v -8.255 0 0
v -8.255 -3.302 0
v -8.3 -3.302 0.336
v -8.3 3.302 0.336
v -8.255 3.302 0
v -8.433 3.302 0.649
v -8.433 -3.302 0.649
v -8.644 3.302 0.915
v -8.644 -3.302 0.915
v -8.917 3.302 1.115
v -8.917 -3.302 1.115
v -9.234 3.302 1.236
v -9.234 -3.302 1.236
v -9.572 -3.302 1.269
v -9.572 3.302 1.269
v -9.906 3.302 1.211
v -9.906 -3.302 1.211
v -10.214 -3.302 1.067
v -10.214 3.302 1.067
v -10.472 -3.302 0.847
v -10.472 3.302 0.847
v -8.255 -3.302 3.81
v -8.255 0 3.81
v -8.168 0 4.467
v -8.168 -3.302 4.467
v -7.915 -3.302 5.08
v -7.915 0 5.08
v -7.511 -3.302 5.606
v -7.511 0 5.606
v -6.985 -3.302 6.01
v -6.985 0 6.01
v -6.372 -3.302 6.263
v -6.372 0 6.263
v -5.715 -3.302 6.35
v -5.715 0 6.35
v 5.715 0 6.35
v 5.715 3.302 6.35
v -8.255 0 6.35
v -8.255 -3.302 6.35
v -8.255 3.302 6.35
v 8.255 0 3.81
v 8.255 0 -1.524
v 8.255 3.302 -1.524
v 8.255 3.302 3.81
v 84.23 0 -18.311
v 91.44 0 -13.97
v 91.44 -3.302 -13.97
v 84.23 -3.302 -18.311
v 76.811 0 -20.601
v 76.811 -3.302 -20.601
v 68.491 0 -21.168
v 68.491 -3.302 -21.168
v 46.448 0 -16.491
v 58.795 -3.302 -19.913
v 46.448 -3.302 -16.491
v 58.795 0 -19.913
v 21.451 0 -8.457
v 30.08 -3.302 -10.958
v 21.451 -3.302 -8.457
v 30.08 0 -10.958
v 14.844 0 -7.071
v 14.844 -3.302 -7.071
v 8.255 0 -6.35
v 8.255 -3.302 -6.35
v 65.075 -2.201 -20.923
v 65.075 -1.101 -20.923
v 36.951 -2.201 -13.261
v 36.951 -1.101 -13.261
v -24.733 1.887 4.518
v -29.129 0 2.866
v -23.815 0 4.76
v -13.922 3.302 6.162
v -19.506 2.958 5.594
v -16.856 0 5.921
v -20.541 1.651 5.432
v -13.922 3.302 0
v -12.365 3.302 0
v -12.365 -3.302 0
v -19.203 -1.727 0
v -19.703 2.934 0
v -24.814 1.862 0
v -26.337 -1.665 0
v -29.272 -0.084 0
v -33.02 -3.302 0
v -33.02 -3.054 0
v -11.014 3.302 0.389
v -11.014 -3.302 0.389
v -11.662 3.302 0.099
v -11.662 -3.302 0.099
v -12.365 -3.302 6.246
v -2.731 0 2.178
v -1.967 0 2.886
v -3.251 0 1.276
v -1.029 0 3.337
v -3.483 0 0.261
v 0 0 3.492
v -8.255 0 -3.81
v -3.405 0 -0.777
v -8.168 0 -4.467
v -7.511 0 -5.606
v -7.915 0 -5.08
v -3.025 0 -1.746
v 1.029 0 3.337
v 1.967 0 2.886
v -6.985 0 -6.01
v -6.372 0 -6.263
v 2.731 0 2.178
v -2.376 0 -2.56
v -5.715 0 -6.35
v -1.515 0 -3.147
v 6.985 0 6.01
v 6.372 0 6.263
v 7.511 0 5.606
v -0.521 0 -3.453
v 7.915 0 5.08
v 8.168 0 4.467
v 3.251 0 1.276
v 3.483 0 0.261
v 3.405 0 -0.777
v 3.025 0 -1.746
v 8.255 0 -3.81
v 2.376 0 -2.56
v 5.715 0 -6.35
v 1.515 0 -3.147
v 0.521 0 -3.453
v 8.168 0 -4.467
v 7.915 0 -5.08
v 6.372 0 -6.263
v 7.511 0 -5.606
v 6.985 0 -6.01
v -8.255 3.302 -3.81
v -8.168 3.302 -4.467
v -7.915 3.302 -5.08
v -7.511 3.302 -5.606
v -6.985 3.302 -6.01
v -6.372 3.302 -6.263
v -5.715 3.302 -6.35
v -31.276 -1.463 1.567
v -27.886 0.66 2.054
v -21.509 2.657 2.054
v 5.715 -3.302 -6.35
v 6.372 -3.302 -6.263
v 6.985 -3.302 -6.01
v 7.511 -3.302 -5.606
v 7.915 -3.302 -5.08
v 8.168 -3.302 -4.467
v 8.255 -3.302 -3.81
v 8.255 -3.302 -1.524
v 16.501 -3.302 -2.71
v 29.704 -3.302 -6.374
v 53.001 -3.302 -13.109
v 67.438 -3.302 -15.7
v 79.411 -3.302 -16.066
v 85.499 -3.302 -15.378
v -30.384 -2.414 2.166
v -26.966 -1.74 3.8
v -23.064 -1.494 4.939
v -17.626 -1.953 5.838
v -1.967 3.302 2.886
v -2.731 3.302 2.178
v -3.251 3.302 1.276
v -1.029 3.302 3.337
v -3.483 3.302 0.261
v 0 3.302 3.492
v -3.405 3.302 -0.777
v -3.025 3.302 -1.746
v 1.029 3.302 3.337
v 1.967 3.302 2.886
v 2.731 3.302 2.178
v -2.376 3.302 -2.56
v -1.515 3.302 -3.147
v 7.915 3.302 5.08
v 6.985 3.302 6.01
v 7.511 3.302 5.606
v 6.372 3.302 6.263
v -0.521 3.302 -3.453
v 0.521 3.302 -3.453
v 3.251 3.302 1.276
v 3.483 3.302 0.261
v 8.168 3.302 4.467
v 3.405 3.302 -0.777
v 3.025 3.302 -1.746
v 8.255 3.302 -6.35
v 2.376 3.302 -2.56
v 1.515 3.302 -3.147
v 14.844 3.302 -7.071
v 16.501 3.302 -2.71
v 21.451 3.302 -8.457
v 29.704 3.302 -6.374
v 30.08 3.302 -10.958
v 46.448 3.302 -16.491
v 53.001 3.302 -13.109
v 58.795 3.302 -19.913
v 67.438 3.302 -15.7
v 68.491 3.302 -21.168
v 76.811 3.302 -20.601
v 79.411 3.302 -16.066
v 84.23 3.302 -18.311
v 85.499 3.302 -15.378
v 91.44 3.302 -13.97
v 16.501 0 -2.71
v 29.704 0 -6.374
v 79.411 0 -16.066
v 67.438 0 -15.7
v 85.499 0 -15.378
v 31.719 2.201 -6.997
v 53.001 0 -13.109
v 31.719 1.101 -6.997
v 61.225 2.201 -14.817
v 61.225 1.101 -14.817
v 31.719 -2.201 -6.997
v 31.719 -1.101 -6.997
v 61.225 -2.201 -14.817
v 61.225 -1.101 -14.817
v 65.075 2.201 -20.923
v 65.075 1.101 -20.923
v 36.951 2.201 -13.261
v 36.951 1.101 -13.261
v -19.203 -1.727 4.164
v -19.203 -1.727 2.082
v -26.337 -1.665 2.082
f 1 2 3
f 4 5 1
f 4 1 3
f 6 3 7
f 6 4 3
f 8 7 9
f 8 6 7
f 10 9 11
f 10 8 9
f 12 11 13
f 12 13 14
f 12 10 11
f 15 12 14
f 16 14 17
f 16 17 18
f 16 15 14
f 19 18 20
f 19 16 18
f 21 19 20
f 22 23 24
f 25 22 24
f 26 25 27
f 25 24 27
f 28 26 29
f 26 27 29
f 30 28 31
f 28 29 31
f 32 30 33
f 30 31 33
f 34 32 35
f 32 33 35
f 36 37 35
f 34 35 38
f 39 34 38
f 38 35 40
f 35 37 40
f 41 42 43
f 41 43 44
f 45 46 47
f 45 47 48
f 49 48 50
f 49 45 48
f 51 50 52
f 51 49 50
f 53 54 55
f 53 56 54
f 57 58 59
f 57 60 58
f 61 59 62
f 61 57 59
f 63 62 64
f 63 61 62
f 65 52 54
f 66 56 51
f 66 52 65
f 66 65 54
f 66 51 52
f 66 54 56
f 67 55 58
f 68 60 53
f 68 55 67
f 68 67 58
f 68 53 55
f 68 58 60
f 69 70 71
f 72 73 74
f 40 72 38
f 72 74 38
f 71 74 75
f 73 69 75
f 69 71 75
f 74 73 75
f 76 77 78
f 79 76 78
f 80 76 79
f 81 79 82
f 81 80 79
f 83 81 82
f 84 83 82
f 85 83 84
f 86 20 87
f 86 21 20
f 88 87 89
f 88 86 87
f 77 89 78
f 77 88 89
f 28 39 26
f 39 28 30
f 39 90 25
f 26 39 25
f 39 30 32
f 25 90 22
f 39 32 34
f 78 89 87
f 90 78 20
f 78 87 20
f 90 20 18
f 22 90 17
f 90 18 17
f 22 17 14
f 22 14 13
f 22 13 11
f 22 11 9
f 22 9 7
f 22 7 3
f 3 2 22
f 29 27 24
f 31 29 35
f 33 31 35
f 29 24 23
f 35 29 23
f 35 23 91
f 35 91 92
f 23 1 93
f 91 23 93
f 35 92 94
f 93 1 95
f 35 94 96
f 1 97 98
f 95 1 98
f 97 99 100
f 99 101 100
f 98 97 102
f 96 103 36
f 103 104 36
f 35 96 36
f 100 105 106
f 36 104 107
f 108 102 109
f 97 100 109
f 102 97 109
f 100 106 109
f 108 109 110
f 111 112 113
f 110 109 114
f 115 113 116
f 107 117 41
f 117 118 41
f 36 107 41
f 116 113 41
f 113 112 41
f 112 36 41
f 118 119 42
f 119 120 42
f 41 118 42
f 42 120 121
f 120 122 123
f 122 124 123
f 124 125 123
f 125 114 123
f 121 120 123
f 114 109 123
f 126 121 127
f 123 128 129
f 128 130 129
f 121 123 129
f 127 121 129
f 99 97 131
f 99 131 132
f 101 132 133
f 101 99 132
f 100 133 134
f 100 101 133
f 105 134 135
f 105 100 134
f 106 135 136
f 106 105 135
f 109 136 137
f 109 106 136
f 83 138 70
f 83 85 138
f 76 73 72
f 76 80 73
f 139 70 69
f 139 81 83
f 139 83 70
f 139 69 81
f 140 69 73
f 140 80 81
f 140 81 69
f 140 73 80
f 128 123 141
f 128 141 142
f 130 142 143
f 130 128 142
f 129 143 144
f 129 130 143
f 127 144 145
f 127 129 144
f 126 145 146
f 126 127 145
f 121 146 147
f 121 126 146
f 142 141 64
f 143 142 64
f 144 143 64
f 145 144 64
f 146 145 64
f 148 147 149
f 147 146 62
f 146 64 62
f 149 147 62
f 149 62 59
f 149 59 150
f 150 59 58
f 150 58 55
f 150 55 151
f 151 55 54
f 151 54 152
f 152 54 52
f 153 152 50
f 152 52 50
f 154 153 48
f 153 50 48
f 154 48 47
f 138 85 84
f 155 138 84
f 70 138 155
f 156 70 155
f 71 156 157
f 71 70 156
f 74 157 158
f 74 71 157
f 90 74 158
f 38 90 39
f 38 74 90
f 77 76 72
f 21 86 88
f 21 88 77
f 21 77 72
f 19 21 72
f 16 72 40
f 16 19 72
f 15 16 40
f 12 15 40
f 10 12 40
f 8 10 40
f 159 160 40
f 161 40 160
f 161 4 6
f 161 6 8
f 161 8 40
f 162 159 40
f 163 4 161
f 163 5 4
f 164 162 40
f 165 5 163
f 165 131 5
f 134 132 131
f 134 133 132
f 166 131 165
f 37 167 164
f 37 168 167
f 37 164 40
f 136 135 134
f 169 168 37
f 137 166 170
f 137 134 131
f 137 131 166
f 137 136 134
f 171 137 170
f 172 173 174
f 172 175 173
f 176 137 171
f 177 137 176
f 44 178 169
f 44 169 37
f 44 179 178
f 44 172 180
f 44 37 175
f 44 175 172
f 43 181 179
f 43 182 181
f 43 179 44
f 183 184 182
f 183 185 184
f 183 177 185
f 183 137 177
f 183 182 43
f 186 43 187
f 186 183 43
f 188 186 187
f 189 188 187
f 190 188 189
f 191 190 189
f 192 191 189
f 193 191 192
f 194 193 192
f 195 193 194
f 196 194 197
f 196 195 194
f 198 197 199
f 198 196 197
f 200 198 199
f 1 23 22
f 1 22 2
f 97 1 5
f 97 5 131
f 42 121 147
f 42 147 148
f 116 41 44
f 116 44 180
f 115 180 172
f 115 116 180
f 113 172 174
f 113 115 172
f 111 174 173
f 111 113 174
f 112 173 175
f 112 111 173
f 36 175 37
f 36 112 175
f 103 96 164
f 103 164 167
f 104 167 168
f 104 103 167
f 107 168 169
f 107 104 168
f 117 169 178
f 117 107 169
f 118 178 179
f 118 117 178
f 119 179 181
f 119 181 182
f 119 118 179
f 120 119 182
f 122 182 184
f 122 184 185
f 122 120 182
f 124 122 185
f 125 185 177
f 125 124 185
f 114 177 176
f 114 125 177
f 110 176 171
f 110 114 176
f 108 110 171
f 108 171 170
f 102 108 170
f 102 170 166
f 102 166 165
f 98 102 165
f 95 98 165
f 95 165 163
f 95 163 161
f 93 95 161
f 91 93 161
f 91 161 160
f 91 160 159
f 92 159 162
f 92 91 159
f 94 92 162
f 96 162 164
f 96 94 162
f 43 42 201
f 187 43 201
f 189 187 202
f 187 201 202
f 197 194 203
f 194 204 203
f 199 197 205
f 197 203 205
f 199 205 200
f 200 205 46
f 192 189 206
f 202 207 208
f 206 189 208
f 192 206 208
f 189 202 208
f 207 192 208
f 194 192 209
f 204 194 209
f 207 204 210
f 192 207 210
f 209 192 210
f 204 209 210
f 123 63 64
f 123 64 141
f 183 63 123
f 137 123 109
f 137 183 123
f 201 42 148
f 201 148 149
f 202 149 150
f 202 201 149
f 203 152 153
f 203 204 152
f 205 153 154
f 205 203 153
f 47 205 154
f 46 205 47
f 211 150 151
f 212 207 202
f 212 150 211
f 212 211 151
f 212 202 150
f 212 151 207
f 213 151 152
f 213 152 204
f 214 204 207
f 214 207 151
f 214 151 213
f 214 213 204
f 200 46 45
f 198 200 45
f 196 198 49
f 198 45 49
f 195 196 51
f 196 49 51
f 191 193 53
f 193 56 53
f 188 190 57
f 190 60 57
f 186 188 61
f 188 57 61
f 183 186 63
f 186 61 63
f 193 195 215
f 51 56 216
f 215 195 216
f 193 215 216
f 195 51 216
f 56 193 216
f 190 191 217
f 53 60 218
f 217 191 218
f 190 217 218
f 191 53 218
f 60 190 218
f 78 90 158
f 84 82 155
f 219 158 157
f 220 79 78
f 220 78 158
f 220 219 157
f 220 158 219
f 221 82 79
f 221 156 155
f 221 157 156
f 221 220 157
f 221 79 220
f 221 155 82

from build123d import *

# Parameters (mm, degrees)
SKETCH1_R           = 3.4925
BOSS_EXTRUDE3_DEPTH = 3.302
BOSS_EXTRUDE4_DEPTH = 3.302
BOSS_EXTRUDE5_DEPTH = 3.302
CUT_EXTRUDE1_REACH  = 8.35


with BuildPart() as part:
    # Sketch1 → Boss-Extrude3 (new body)
    with BuildSketch(Plane(origin=(0, 0, 0), x_dir=(1, 0, 0), z_dir=(0, 1, 0))):
        with BuildLine():
            ThreePointArc((-10.47160211, -0.846666667), (-11.327855674, -0.22130784), (-12.364806331, 0))
            Line((-12.364806331, 0), (-33.02, 0))
            add(Edge.make_bspline(
                [(-33.02, 0), (-27.473096433, -6.223159861), (-8.255, -6.35)],
                knots=[0, 0, 0, 1, 1, 1], degree=2))
            Line((-8.255, -6.35), (-8.255, -3.81))
            Line((-8.255, -3.81), (-8.255, 0))
            ThreePointArc((-8.255, 0), (-9.071835946, -1.186398896), (-10.47160211, -0.846666667))
        make_face()
        with BuildLine():
            ThreePointArc((5.715, 6.35), (7.511051224, 5.606051224), (8.255, 3.81))
            Line((8.255, 3.81), (8.255, -3.81))
            ThreePointArc((8.255, -3.81), (7.511051224, -5.606051224), (5.715, -6.35))
            Line((5.715, -6.35), (-5.715, -6.35))
            ThreePointArc((-5.715, -6.35), (-7.511051224, -5.606051224), (-8.255, -3.81))
            Line((-8.255, -3.81), (-8.255, 3.81))
            ThreePointArc((-8.255, 3.81), (-7.511051224, 5.606051224), (-5.715, 6.35))
            Line((-5.715, 6.35), (5.715, 6.35))
        make_face()
        with Locations(Location((0, 0, 0), (0, 0, 270))):  # turned: the seam where the file's is
            Circle(SKETCH1_R, mode=Mode.SUBTRACT)
        with BuildLine():
            ThreePointArc((-8.255, -3.81), (-7.511051224, -5.606051224), (-5.715, -6.35))
            Line((-5.715, -6.35), (-8.255, -6.35))
            Line((-8.255, -6.35), (-8.255, -3.81))
        make_face()
        with BuildLine():
            Line((8.255, 3.527942587), (8.255, 1.524))
            add(Edge.make_bspline(
                [(8.255, 1.524), (26.922144182, 2.150849617), (62.646246262, 22.822886738), (91.44, 13.97)],
                knots=[0, 0, 0, 0, 1, 1, 1, 1], degree=3))
            add(Edge.make_bspline(
                [(91.44, 13.97), (66.350363848, 33.352051218), (36.841337127, 7.764653999), (8.255, 6.35)],
                knots=[0, 0, 0, 0, 1, 1, 1, 1], degree=3))
            Line((8.255, 6.35), (8.255, 3.81))
            Line((8.255, 3.81), (8.255, 3.527942587))
        make_face()
        with BuildLine():
            Line((8.255, 6.35), (5.715, 6.35))
            ThreePointArc((5.715, 6.35), (7.511051224, 5.606051224), (8.255, 3.81))
            Line((8.255, 3.81), (8.255, 6.35))
        make_face()
    extrude(amount=BOSS_EXTRUDE3_DEPTH)

    # Sketch1_8 → Boss-Extrude4 (add)
    with BuildSketch(Plane(origin=(0, 0, 0), x_dir=(1, 0, 0), z_dir=(0, 1, 0))):
        with BuildLine():
            Line((8.255, 3.527942587), (8.255, 1.524))
            add(Edge.make_bspline(
                [(8.255, 1.524), (26.922144182, 2.150849617), (62.646246262, 22.822886738), (91.44, 13.97)],
                knots=[0, 0, 0, 0, 1, 1, 1, 1], degree=3))
            add(Edge.make_bspline(
                [(91.44, 13.97), (66.350363848, 33.352051218), (36.841337127, 7.764653999), (8.255, 6.35)],
                knots=[0, 0, 0, 0, 1, 1, 1, 1], degree=3))
            Line((8.255, 6.35), (8.255, 3.81))
            Line((8.255, 3.81), (8.255, 3.527942587))
        make_face()
        with BuildLine():
            Line((8.255, 6.35), (5.715, 6.35))
            ThreePointArc((5.715, 6.35), (7.511051224, 5.606051224), (8.255, 3.81))
            Line((8.255, 3.81), (8.255, 6.35))
        make_face()
    extrude(amount=-BOSS_EXTRUDE4_DEPTH)

    # Sketch1_9 → Boss-Extrude5 (add)
    with BuildSketch(Plane(origin=(0, 0, 0), x_dir=(1, 0, 0), z_dir=(0, 1, 0))):
        with BuildLine():
            ThreePointArc((-10.47160211, -0.846666667), (-11.327855674, -0.22130784), (-12.364806331, 0))
            Line((-12.364806331, 0), (-33.02, 0))
            add(Edge.make_bspline(
                [(-33.02, 0), (-27.473096433, -6.223159861), (-8.255, -6.35)],
                knots=[0, 0, 0, 1, 1, 1], degree=2))
            Line((-8.255, -6.35), (-8.255, -3.81))
            Line((-8.255, -3.81), (-8.255, 0))
            ThreePointArc((-8.255, 0), (-9.071835946, -1.186398896), (-10.47160211, -0.846666667))
        make_face()
        with BuildLine():
            ThreePointArc((-8.255, -3.81), (-7.511051224, -5.606051224), (-5.715, -6.35))
            Line((-5.715, -6.35), (-8.255, -6.35))
            Line((-8.255, -6.35), (-8.255, -3.81))
        make_face()
    extrude(amount=-BOSS_EXTRUDE5_DEPTH)

    # Sketch2 → Cut-Extrude1 (cut, up to next)
    with BuildSketch(Plane.XY, mode=Mode.PRIVATE) as cut_extrude1_sk1:
        with BuildLine():
            Line((-33.02, 3.302), (-33.02, -3.053994927))
            add(Edge.make_bspline(
                [(-33.02, -3.053994927), (-28.519594092, 1.640722514), (-22.101826858, 3.211473856), (-13.921878912, 3.302)],
                knots=[0, 0, 0, 0, 0.941080878, 0.941080878, 0.941080878, 0.941080878], degree=3))
            Line((-13.921878912, 3.302), (-33.02, 3.302))
        make_face()
    cut_extrude1_tool1 = extrude(cut_extrude1_sk1.sketch, amount=CUT_EXTRUDE1_REACH, mode=Mode.PRIVATE) & part.part
    add(cut_extrude1_tool1.solids().sort_by_distance((-28.707051, 1.545014, 0))[0], mode=Mode.SUBTRACT)
    # Sketch2 → Cut-Extrude1 (cut, up to next)
    with BuildSketch(Plane.XY, mode=Mode.PRIVATE) as cut_extrude1_sk2:
        with BuildLine():
            Line((-12.364806331, -3.302), (-33.02, -3.302))
            add(Edge.make_bspline(
                [(-12.364806331, -3.302), (-18.804874471, -1.031483357), (-26.812471442, -0.753963495), (-33.02, -3.302)],
                knots=[0, 0, 0, 0, 1, 1, 1, 1], degree=3))
        make_face()
    cut_extrude1_tool2 = extrude(cut_extrude1_sk2.sketch, amount=CUT_EXTRUDE1_REACH, mode=Mode.PRIVATE) & part.part
    add(cut_extrude1_tool2.solids().sort_by_distance((-22.84596, -2.573969, 0))[0], mode=Mode.SUBTRACT)


solid = part.part
